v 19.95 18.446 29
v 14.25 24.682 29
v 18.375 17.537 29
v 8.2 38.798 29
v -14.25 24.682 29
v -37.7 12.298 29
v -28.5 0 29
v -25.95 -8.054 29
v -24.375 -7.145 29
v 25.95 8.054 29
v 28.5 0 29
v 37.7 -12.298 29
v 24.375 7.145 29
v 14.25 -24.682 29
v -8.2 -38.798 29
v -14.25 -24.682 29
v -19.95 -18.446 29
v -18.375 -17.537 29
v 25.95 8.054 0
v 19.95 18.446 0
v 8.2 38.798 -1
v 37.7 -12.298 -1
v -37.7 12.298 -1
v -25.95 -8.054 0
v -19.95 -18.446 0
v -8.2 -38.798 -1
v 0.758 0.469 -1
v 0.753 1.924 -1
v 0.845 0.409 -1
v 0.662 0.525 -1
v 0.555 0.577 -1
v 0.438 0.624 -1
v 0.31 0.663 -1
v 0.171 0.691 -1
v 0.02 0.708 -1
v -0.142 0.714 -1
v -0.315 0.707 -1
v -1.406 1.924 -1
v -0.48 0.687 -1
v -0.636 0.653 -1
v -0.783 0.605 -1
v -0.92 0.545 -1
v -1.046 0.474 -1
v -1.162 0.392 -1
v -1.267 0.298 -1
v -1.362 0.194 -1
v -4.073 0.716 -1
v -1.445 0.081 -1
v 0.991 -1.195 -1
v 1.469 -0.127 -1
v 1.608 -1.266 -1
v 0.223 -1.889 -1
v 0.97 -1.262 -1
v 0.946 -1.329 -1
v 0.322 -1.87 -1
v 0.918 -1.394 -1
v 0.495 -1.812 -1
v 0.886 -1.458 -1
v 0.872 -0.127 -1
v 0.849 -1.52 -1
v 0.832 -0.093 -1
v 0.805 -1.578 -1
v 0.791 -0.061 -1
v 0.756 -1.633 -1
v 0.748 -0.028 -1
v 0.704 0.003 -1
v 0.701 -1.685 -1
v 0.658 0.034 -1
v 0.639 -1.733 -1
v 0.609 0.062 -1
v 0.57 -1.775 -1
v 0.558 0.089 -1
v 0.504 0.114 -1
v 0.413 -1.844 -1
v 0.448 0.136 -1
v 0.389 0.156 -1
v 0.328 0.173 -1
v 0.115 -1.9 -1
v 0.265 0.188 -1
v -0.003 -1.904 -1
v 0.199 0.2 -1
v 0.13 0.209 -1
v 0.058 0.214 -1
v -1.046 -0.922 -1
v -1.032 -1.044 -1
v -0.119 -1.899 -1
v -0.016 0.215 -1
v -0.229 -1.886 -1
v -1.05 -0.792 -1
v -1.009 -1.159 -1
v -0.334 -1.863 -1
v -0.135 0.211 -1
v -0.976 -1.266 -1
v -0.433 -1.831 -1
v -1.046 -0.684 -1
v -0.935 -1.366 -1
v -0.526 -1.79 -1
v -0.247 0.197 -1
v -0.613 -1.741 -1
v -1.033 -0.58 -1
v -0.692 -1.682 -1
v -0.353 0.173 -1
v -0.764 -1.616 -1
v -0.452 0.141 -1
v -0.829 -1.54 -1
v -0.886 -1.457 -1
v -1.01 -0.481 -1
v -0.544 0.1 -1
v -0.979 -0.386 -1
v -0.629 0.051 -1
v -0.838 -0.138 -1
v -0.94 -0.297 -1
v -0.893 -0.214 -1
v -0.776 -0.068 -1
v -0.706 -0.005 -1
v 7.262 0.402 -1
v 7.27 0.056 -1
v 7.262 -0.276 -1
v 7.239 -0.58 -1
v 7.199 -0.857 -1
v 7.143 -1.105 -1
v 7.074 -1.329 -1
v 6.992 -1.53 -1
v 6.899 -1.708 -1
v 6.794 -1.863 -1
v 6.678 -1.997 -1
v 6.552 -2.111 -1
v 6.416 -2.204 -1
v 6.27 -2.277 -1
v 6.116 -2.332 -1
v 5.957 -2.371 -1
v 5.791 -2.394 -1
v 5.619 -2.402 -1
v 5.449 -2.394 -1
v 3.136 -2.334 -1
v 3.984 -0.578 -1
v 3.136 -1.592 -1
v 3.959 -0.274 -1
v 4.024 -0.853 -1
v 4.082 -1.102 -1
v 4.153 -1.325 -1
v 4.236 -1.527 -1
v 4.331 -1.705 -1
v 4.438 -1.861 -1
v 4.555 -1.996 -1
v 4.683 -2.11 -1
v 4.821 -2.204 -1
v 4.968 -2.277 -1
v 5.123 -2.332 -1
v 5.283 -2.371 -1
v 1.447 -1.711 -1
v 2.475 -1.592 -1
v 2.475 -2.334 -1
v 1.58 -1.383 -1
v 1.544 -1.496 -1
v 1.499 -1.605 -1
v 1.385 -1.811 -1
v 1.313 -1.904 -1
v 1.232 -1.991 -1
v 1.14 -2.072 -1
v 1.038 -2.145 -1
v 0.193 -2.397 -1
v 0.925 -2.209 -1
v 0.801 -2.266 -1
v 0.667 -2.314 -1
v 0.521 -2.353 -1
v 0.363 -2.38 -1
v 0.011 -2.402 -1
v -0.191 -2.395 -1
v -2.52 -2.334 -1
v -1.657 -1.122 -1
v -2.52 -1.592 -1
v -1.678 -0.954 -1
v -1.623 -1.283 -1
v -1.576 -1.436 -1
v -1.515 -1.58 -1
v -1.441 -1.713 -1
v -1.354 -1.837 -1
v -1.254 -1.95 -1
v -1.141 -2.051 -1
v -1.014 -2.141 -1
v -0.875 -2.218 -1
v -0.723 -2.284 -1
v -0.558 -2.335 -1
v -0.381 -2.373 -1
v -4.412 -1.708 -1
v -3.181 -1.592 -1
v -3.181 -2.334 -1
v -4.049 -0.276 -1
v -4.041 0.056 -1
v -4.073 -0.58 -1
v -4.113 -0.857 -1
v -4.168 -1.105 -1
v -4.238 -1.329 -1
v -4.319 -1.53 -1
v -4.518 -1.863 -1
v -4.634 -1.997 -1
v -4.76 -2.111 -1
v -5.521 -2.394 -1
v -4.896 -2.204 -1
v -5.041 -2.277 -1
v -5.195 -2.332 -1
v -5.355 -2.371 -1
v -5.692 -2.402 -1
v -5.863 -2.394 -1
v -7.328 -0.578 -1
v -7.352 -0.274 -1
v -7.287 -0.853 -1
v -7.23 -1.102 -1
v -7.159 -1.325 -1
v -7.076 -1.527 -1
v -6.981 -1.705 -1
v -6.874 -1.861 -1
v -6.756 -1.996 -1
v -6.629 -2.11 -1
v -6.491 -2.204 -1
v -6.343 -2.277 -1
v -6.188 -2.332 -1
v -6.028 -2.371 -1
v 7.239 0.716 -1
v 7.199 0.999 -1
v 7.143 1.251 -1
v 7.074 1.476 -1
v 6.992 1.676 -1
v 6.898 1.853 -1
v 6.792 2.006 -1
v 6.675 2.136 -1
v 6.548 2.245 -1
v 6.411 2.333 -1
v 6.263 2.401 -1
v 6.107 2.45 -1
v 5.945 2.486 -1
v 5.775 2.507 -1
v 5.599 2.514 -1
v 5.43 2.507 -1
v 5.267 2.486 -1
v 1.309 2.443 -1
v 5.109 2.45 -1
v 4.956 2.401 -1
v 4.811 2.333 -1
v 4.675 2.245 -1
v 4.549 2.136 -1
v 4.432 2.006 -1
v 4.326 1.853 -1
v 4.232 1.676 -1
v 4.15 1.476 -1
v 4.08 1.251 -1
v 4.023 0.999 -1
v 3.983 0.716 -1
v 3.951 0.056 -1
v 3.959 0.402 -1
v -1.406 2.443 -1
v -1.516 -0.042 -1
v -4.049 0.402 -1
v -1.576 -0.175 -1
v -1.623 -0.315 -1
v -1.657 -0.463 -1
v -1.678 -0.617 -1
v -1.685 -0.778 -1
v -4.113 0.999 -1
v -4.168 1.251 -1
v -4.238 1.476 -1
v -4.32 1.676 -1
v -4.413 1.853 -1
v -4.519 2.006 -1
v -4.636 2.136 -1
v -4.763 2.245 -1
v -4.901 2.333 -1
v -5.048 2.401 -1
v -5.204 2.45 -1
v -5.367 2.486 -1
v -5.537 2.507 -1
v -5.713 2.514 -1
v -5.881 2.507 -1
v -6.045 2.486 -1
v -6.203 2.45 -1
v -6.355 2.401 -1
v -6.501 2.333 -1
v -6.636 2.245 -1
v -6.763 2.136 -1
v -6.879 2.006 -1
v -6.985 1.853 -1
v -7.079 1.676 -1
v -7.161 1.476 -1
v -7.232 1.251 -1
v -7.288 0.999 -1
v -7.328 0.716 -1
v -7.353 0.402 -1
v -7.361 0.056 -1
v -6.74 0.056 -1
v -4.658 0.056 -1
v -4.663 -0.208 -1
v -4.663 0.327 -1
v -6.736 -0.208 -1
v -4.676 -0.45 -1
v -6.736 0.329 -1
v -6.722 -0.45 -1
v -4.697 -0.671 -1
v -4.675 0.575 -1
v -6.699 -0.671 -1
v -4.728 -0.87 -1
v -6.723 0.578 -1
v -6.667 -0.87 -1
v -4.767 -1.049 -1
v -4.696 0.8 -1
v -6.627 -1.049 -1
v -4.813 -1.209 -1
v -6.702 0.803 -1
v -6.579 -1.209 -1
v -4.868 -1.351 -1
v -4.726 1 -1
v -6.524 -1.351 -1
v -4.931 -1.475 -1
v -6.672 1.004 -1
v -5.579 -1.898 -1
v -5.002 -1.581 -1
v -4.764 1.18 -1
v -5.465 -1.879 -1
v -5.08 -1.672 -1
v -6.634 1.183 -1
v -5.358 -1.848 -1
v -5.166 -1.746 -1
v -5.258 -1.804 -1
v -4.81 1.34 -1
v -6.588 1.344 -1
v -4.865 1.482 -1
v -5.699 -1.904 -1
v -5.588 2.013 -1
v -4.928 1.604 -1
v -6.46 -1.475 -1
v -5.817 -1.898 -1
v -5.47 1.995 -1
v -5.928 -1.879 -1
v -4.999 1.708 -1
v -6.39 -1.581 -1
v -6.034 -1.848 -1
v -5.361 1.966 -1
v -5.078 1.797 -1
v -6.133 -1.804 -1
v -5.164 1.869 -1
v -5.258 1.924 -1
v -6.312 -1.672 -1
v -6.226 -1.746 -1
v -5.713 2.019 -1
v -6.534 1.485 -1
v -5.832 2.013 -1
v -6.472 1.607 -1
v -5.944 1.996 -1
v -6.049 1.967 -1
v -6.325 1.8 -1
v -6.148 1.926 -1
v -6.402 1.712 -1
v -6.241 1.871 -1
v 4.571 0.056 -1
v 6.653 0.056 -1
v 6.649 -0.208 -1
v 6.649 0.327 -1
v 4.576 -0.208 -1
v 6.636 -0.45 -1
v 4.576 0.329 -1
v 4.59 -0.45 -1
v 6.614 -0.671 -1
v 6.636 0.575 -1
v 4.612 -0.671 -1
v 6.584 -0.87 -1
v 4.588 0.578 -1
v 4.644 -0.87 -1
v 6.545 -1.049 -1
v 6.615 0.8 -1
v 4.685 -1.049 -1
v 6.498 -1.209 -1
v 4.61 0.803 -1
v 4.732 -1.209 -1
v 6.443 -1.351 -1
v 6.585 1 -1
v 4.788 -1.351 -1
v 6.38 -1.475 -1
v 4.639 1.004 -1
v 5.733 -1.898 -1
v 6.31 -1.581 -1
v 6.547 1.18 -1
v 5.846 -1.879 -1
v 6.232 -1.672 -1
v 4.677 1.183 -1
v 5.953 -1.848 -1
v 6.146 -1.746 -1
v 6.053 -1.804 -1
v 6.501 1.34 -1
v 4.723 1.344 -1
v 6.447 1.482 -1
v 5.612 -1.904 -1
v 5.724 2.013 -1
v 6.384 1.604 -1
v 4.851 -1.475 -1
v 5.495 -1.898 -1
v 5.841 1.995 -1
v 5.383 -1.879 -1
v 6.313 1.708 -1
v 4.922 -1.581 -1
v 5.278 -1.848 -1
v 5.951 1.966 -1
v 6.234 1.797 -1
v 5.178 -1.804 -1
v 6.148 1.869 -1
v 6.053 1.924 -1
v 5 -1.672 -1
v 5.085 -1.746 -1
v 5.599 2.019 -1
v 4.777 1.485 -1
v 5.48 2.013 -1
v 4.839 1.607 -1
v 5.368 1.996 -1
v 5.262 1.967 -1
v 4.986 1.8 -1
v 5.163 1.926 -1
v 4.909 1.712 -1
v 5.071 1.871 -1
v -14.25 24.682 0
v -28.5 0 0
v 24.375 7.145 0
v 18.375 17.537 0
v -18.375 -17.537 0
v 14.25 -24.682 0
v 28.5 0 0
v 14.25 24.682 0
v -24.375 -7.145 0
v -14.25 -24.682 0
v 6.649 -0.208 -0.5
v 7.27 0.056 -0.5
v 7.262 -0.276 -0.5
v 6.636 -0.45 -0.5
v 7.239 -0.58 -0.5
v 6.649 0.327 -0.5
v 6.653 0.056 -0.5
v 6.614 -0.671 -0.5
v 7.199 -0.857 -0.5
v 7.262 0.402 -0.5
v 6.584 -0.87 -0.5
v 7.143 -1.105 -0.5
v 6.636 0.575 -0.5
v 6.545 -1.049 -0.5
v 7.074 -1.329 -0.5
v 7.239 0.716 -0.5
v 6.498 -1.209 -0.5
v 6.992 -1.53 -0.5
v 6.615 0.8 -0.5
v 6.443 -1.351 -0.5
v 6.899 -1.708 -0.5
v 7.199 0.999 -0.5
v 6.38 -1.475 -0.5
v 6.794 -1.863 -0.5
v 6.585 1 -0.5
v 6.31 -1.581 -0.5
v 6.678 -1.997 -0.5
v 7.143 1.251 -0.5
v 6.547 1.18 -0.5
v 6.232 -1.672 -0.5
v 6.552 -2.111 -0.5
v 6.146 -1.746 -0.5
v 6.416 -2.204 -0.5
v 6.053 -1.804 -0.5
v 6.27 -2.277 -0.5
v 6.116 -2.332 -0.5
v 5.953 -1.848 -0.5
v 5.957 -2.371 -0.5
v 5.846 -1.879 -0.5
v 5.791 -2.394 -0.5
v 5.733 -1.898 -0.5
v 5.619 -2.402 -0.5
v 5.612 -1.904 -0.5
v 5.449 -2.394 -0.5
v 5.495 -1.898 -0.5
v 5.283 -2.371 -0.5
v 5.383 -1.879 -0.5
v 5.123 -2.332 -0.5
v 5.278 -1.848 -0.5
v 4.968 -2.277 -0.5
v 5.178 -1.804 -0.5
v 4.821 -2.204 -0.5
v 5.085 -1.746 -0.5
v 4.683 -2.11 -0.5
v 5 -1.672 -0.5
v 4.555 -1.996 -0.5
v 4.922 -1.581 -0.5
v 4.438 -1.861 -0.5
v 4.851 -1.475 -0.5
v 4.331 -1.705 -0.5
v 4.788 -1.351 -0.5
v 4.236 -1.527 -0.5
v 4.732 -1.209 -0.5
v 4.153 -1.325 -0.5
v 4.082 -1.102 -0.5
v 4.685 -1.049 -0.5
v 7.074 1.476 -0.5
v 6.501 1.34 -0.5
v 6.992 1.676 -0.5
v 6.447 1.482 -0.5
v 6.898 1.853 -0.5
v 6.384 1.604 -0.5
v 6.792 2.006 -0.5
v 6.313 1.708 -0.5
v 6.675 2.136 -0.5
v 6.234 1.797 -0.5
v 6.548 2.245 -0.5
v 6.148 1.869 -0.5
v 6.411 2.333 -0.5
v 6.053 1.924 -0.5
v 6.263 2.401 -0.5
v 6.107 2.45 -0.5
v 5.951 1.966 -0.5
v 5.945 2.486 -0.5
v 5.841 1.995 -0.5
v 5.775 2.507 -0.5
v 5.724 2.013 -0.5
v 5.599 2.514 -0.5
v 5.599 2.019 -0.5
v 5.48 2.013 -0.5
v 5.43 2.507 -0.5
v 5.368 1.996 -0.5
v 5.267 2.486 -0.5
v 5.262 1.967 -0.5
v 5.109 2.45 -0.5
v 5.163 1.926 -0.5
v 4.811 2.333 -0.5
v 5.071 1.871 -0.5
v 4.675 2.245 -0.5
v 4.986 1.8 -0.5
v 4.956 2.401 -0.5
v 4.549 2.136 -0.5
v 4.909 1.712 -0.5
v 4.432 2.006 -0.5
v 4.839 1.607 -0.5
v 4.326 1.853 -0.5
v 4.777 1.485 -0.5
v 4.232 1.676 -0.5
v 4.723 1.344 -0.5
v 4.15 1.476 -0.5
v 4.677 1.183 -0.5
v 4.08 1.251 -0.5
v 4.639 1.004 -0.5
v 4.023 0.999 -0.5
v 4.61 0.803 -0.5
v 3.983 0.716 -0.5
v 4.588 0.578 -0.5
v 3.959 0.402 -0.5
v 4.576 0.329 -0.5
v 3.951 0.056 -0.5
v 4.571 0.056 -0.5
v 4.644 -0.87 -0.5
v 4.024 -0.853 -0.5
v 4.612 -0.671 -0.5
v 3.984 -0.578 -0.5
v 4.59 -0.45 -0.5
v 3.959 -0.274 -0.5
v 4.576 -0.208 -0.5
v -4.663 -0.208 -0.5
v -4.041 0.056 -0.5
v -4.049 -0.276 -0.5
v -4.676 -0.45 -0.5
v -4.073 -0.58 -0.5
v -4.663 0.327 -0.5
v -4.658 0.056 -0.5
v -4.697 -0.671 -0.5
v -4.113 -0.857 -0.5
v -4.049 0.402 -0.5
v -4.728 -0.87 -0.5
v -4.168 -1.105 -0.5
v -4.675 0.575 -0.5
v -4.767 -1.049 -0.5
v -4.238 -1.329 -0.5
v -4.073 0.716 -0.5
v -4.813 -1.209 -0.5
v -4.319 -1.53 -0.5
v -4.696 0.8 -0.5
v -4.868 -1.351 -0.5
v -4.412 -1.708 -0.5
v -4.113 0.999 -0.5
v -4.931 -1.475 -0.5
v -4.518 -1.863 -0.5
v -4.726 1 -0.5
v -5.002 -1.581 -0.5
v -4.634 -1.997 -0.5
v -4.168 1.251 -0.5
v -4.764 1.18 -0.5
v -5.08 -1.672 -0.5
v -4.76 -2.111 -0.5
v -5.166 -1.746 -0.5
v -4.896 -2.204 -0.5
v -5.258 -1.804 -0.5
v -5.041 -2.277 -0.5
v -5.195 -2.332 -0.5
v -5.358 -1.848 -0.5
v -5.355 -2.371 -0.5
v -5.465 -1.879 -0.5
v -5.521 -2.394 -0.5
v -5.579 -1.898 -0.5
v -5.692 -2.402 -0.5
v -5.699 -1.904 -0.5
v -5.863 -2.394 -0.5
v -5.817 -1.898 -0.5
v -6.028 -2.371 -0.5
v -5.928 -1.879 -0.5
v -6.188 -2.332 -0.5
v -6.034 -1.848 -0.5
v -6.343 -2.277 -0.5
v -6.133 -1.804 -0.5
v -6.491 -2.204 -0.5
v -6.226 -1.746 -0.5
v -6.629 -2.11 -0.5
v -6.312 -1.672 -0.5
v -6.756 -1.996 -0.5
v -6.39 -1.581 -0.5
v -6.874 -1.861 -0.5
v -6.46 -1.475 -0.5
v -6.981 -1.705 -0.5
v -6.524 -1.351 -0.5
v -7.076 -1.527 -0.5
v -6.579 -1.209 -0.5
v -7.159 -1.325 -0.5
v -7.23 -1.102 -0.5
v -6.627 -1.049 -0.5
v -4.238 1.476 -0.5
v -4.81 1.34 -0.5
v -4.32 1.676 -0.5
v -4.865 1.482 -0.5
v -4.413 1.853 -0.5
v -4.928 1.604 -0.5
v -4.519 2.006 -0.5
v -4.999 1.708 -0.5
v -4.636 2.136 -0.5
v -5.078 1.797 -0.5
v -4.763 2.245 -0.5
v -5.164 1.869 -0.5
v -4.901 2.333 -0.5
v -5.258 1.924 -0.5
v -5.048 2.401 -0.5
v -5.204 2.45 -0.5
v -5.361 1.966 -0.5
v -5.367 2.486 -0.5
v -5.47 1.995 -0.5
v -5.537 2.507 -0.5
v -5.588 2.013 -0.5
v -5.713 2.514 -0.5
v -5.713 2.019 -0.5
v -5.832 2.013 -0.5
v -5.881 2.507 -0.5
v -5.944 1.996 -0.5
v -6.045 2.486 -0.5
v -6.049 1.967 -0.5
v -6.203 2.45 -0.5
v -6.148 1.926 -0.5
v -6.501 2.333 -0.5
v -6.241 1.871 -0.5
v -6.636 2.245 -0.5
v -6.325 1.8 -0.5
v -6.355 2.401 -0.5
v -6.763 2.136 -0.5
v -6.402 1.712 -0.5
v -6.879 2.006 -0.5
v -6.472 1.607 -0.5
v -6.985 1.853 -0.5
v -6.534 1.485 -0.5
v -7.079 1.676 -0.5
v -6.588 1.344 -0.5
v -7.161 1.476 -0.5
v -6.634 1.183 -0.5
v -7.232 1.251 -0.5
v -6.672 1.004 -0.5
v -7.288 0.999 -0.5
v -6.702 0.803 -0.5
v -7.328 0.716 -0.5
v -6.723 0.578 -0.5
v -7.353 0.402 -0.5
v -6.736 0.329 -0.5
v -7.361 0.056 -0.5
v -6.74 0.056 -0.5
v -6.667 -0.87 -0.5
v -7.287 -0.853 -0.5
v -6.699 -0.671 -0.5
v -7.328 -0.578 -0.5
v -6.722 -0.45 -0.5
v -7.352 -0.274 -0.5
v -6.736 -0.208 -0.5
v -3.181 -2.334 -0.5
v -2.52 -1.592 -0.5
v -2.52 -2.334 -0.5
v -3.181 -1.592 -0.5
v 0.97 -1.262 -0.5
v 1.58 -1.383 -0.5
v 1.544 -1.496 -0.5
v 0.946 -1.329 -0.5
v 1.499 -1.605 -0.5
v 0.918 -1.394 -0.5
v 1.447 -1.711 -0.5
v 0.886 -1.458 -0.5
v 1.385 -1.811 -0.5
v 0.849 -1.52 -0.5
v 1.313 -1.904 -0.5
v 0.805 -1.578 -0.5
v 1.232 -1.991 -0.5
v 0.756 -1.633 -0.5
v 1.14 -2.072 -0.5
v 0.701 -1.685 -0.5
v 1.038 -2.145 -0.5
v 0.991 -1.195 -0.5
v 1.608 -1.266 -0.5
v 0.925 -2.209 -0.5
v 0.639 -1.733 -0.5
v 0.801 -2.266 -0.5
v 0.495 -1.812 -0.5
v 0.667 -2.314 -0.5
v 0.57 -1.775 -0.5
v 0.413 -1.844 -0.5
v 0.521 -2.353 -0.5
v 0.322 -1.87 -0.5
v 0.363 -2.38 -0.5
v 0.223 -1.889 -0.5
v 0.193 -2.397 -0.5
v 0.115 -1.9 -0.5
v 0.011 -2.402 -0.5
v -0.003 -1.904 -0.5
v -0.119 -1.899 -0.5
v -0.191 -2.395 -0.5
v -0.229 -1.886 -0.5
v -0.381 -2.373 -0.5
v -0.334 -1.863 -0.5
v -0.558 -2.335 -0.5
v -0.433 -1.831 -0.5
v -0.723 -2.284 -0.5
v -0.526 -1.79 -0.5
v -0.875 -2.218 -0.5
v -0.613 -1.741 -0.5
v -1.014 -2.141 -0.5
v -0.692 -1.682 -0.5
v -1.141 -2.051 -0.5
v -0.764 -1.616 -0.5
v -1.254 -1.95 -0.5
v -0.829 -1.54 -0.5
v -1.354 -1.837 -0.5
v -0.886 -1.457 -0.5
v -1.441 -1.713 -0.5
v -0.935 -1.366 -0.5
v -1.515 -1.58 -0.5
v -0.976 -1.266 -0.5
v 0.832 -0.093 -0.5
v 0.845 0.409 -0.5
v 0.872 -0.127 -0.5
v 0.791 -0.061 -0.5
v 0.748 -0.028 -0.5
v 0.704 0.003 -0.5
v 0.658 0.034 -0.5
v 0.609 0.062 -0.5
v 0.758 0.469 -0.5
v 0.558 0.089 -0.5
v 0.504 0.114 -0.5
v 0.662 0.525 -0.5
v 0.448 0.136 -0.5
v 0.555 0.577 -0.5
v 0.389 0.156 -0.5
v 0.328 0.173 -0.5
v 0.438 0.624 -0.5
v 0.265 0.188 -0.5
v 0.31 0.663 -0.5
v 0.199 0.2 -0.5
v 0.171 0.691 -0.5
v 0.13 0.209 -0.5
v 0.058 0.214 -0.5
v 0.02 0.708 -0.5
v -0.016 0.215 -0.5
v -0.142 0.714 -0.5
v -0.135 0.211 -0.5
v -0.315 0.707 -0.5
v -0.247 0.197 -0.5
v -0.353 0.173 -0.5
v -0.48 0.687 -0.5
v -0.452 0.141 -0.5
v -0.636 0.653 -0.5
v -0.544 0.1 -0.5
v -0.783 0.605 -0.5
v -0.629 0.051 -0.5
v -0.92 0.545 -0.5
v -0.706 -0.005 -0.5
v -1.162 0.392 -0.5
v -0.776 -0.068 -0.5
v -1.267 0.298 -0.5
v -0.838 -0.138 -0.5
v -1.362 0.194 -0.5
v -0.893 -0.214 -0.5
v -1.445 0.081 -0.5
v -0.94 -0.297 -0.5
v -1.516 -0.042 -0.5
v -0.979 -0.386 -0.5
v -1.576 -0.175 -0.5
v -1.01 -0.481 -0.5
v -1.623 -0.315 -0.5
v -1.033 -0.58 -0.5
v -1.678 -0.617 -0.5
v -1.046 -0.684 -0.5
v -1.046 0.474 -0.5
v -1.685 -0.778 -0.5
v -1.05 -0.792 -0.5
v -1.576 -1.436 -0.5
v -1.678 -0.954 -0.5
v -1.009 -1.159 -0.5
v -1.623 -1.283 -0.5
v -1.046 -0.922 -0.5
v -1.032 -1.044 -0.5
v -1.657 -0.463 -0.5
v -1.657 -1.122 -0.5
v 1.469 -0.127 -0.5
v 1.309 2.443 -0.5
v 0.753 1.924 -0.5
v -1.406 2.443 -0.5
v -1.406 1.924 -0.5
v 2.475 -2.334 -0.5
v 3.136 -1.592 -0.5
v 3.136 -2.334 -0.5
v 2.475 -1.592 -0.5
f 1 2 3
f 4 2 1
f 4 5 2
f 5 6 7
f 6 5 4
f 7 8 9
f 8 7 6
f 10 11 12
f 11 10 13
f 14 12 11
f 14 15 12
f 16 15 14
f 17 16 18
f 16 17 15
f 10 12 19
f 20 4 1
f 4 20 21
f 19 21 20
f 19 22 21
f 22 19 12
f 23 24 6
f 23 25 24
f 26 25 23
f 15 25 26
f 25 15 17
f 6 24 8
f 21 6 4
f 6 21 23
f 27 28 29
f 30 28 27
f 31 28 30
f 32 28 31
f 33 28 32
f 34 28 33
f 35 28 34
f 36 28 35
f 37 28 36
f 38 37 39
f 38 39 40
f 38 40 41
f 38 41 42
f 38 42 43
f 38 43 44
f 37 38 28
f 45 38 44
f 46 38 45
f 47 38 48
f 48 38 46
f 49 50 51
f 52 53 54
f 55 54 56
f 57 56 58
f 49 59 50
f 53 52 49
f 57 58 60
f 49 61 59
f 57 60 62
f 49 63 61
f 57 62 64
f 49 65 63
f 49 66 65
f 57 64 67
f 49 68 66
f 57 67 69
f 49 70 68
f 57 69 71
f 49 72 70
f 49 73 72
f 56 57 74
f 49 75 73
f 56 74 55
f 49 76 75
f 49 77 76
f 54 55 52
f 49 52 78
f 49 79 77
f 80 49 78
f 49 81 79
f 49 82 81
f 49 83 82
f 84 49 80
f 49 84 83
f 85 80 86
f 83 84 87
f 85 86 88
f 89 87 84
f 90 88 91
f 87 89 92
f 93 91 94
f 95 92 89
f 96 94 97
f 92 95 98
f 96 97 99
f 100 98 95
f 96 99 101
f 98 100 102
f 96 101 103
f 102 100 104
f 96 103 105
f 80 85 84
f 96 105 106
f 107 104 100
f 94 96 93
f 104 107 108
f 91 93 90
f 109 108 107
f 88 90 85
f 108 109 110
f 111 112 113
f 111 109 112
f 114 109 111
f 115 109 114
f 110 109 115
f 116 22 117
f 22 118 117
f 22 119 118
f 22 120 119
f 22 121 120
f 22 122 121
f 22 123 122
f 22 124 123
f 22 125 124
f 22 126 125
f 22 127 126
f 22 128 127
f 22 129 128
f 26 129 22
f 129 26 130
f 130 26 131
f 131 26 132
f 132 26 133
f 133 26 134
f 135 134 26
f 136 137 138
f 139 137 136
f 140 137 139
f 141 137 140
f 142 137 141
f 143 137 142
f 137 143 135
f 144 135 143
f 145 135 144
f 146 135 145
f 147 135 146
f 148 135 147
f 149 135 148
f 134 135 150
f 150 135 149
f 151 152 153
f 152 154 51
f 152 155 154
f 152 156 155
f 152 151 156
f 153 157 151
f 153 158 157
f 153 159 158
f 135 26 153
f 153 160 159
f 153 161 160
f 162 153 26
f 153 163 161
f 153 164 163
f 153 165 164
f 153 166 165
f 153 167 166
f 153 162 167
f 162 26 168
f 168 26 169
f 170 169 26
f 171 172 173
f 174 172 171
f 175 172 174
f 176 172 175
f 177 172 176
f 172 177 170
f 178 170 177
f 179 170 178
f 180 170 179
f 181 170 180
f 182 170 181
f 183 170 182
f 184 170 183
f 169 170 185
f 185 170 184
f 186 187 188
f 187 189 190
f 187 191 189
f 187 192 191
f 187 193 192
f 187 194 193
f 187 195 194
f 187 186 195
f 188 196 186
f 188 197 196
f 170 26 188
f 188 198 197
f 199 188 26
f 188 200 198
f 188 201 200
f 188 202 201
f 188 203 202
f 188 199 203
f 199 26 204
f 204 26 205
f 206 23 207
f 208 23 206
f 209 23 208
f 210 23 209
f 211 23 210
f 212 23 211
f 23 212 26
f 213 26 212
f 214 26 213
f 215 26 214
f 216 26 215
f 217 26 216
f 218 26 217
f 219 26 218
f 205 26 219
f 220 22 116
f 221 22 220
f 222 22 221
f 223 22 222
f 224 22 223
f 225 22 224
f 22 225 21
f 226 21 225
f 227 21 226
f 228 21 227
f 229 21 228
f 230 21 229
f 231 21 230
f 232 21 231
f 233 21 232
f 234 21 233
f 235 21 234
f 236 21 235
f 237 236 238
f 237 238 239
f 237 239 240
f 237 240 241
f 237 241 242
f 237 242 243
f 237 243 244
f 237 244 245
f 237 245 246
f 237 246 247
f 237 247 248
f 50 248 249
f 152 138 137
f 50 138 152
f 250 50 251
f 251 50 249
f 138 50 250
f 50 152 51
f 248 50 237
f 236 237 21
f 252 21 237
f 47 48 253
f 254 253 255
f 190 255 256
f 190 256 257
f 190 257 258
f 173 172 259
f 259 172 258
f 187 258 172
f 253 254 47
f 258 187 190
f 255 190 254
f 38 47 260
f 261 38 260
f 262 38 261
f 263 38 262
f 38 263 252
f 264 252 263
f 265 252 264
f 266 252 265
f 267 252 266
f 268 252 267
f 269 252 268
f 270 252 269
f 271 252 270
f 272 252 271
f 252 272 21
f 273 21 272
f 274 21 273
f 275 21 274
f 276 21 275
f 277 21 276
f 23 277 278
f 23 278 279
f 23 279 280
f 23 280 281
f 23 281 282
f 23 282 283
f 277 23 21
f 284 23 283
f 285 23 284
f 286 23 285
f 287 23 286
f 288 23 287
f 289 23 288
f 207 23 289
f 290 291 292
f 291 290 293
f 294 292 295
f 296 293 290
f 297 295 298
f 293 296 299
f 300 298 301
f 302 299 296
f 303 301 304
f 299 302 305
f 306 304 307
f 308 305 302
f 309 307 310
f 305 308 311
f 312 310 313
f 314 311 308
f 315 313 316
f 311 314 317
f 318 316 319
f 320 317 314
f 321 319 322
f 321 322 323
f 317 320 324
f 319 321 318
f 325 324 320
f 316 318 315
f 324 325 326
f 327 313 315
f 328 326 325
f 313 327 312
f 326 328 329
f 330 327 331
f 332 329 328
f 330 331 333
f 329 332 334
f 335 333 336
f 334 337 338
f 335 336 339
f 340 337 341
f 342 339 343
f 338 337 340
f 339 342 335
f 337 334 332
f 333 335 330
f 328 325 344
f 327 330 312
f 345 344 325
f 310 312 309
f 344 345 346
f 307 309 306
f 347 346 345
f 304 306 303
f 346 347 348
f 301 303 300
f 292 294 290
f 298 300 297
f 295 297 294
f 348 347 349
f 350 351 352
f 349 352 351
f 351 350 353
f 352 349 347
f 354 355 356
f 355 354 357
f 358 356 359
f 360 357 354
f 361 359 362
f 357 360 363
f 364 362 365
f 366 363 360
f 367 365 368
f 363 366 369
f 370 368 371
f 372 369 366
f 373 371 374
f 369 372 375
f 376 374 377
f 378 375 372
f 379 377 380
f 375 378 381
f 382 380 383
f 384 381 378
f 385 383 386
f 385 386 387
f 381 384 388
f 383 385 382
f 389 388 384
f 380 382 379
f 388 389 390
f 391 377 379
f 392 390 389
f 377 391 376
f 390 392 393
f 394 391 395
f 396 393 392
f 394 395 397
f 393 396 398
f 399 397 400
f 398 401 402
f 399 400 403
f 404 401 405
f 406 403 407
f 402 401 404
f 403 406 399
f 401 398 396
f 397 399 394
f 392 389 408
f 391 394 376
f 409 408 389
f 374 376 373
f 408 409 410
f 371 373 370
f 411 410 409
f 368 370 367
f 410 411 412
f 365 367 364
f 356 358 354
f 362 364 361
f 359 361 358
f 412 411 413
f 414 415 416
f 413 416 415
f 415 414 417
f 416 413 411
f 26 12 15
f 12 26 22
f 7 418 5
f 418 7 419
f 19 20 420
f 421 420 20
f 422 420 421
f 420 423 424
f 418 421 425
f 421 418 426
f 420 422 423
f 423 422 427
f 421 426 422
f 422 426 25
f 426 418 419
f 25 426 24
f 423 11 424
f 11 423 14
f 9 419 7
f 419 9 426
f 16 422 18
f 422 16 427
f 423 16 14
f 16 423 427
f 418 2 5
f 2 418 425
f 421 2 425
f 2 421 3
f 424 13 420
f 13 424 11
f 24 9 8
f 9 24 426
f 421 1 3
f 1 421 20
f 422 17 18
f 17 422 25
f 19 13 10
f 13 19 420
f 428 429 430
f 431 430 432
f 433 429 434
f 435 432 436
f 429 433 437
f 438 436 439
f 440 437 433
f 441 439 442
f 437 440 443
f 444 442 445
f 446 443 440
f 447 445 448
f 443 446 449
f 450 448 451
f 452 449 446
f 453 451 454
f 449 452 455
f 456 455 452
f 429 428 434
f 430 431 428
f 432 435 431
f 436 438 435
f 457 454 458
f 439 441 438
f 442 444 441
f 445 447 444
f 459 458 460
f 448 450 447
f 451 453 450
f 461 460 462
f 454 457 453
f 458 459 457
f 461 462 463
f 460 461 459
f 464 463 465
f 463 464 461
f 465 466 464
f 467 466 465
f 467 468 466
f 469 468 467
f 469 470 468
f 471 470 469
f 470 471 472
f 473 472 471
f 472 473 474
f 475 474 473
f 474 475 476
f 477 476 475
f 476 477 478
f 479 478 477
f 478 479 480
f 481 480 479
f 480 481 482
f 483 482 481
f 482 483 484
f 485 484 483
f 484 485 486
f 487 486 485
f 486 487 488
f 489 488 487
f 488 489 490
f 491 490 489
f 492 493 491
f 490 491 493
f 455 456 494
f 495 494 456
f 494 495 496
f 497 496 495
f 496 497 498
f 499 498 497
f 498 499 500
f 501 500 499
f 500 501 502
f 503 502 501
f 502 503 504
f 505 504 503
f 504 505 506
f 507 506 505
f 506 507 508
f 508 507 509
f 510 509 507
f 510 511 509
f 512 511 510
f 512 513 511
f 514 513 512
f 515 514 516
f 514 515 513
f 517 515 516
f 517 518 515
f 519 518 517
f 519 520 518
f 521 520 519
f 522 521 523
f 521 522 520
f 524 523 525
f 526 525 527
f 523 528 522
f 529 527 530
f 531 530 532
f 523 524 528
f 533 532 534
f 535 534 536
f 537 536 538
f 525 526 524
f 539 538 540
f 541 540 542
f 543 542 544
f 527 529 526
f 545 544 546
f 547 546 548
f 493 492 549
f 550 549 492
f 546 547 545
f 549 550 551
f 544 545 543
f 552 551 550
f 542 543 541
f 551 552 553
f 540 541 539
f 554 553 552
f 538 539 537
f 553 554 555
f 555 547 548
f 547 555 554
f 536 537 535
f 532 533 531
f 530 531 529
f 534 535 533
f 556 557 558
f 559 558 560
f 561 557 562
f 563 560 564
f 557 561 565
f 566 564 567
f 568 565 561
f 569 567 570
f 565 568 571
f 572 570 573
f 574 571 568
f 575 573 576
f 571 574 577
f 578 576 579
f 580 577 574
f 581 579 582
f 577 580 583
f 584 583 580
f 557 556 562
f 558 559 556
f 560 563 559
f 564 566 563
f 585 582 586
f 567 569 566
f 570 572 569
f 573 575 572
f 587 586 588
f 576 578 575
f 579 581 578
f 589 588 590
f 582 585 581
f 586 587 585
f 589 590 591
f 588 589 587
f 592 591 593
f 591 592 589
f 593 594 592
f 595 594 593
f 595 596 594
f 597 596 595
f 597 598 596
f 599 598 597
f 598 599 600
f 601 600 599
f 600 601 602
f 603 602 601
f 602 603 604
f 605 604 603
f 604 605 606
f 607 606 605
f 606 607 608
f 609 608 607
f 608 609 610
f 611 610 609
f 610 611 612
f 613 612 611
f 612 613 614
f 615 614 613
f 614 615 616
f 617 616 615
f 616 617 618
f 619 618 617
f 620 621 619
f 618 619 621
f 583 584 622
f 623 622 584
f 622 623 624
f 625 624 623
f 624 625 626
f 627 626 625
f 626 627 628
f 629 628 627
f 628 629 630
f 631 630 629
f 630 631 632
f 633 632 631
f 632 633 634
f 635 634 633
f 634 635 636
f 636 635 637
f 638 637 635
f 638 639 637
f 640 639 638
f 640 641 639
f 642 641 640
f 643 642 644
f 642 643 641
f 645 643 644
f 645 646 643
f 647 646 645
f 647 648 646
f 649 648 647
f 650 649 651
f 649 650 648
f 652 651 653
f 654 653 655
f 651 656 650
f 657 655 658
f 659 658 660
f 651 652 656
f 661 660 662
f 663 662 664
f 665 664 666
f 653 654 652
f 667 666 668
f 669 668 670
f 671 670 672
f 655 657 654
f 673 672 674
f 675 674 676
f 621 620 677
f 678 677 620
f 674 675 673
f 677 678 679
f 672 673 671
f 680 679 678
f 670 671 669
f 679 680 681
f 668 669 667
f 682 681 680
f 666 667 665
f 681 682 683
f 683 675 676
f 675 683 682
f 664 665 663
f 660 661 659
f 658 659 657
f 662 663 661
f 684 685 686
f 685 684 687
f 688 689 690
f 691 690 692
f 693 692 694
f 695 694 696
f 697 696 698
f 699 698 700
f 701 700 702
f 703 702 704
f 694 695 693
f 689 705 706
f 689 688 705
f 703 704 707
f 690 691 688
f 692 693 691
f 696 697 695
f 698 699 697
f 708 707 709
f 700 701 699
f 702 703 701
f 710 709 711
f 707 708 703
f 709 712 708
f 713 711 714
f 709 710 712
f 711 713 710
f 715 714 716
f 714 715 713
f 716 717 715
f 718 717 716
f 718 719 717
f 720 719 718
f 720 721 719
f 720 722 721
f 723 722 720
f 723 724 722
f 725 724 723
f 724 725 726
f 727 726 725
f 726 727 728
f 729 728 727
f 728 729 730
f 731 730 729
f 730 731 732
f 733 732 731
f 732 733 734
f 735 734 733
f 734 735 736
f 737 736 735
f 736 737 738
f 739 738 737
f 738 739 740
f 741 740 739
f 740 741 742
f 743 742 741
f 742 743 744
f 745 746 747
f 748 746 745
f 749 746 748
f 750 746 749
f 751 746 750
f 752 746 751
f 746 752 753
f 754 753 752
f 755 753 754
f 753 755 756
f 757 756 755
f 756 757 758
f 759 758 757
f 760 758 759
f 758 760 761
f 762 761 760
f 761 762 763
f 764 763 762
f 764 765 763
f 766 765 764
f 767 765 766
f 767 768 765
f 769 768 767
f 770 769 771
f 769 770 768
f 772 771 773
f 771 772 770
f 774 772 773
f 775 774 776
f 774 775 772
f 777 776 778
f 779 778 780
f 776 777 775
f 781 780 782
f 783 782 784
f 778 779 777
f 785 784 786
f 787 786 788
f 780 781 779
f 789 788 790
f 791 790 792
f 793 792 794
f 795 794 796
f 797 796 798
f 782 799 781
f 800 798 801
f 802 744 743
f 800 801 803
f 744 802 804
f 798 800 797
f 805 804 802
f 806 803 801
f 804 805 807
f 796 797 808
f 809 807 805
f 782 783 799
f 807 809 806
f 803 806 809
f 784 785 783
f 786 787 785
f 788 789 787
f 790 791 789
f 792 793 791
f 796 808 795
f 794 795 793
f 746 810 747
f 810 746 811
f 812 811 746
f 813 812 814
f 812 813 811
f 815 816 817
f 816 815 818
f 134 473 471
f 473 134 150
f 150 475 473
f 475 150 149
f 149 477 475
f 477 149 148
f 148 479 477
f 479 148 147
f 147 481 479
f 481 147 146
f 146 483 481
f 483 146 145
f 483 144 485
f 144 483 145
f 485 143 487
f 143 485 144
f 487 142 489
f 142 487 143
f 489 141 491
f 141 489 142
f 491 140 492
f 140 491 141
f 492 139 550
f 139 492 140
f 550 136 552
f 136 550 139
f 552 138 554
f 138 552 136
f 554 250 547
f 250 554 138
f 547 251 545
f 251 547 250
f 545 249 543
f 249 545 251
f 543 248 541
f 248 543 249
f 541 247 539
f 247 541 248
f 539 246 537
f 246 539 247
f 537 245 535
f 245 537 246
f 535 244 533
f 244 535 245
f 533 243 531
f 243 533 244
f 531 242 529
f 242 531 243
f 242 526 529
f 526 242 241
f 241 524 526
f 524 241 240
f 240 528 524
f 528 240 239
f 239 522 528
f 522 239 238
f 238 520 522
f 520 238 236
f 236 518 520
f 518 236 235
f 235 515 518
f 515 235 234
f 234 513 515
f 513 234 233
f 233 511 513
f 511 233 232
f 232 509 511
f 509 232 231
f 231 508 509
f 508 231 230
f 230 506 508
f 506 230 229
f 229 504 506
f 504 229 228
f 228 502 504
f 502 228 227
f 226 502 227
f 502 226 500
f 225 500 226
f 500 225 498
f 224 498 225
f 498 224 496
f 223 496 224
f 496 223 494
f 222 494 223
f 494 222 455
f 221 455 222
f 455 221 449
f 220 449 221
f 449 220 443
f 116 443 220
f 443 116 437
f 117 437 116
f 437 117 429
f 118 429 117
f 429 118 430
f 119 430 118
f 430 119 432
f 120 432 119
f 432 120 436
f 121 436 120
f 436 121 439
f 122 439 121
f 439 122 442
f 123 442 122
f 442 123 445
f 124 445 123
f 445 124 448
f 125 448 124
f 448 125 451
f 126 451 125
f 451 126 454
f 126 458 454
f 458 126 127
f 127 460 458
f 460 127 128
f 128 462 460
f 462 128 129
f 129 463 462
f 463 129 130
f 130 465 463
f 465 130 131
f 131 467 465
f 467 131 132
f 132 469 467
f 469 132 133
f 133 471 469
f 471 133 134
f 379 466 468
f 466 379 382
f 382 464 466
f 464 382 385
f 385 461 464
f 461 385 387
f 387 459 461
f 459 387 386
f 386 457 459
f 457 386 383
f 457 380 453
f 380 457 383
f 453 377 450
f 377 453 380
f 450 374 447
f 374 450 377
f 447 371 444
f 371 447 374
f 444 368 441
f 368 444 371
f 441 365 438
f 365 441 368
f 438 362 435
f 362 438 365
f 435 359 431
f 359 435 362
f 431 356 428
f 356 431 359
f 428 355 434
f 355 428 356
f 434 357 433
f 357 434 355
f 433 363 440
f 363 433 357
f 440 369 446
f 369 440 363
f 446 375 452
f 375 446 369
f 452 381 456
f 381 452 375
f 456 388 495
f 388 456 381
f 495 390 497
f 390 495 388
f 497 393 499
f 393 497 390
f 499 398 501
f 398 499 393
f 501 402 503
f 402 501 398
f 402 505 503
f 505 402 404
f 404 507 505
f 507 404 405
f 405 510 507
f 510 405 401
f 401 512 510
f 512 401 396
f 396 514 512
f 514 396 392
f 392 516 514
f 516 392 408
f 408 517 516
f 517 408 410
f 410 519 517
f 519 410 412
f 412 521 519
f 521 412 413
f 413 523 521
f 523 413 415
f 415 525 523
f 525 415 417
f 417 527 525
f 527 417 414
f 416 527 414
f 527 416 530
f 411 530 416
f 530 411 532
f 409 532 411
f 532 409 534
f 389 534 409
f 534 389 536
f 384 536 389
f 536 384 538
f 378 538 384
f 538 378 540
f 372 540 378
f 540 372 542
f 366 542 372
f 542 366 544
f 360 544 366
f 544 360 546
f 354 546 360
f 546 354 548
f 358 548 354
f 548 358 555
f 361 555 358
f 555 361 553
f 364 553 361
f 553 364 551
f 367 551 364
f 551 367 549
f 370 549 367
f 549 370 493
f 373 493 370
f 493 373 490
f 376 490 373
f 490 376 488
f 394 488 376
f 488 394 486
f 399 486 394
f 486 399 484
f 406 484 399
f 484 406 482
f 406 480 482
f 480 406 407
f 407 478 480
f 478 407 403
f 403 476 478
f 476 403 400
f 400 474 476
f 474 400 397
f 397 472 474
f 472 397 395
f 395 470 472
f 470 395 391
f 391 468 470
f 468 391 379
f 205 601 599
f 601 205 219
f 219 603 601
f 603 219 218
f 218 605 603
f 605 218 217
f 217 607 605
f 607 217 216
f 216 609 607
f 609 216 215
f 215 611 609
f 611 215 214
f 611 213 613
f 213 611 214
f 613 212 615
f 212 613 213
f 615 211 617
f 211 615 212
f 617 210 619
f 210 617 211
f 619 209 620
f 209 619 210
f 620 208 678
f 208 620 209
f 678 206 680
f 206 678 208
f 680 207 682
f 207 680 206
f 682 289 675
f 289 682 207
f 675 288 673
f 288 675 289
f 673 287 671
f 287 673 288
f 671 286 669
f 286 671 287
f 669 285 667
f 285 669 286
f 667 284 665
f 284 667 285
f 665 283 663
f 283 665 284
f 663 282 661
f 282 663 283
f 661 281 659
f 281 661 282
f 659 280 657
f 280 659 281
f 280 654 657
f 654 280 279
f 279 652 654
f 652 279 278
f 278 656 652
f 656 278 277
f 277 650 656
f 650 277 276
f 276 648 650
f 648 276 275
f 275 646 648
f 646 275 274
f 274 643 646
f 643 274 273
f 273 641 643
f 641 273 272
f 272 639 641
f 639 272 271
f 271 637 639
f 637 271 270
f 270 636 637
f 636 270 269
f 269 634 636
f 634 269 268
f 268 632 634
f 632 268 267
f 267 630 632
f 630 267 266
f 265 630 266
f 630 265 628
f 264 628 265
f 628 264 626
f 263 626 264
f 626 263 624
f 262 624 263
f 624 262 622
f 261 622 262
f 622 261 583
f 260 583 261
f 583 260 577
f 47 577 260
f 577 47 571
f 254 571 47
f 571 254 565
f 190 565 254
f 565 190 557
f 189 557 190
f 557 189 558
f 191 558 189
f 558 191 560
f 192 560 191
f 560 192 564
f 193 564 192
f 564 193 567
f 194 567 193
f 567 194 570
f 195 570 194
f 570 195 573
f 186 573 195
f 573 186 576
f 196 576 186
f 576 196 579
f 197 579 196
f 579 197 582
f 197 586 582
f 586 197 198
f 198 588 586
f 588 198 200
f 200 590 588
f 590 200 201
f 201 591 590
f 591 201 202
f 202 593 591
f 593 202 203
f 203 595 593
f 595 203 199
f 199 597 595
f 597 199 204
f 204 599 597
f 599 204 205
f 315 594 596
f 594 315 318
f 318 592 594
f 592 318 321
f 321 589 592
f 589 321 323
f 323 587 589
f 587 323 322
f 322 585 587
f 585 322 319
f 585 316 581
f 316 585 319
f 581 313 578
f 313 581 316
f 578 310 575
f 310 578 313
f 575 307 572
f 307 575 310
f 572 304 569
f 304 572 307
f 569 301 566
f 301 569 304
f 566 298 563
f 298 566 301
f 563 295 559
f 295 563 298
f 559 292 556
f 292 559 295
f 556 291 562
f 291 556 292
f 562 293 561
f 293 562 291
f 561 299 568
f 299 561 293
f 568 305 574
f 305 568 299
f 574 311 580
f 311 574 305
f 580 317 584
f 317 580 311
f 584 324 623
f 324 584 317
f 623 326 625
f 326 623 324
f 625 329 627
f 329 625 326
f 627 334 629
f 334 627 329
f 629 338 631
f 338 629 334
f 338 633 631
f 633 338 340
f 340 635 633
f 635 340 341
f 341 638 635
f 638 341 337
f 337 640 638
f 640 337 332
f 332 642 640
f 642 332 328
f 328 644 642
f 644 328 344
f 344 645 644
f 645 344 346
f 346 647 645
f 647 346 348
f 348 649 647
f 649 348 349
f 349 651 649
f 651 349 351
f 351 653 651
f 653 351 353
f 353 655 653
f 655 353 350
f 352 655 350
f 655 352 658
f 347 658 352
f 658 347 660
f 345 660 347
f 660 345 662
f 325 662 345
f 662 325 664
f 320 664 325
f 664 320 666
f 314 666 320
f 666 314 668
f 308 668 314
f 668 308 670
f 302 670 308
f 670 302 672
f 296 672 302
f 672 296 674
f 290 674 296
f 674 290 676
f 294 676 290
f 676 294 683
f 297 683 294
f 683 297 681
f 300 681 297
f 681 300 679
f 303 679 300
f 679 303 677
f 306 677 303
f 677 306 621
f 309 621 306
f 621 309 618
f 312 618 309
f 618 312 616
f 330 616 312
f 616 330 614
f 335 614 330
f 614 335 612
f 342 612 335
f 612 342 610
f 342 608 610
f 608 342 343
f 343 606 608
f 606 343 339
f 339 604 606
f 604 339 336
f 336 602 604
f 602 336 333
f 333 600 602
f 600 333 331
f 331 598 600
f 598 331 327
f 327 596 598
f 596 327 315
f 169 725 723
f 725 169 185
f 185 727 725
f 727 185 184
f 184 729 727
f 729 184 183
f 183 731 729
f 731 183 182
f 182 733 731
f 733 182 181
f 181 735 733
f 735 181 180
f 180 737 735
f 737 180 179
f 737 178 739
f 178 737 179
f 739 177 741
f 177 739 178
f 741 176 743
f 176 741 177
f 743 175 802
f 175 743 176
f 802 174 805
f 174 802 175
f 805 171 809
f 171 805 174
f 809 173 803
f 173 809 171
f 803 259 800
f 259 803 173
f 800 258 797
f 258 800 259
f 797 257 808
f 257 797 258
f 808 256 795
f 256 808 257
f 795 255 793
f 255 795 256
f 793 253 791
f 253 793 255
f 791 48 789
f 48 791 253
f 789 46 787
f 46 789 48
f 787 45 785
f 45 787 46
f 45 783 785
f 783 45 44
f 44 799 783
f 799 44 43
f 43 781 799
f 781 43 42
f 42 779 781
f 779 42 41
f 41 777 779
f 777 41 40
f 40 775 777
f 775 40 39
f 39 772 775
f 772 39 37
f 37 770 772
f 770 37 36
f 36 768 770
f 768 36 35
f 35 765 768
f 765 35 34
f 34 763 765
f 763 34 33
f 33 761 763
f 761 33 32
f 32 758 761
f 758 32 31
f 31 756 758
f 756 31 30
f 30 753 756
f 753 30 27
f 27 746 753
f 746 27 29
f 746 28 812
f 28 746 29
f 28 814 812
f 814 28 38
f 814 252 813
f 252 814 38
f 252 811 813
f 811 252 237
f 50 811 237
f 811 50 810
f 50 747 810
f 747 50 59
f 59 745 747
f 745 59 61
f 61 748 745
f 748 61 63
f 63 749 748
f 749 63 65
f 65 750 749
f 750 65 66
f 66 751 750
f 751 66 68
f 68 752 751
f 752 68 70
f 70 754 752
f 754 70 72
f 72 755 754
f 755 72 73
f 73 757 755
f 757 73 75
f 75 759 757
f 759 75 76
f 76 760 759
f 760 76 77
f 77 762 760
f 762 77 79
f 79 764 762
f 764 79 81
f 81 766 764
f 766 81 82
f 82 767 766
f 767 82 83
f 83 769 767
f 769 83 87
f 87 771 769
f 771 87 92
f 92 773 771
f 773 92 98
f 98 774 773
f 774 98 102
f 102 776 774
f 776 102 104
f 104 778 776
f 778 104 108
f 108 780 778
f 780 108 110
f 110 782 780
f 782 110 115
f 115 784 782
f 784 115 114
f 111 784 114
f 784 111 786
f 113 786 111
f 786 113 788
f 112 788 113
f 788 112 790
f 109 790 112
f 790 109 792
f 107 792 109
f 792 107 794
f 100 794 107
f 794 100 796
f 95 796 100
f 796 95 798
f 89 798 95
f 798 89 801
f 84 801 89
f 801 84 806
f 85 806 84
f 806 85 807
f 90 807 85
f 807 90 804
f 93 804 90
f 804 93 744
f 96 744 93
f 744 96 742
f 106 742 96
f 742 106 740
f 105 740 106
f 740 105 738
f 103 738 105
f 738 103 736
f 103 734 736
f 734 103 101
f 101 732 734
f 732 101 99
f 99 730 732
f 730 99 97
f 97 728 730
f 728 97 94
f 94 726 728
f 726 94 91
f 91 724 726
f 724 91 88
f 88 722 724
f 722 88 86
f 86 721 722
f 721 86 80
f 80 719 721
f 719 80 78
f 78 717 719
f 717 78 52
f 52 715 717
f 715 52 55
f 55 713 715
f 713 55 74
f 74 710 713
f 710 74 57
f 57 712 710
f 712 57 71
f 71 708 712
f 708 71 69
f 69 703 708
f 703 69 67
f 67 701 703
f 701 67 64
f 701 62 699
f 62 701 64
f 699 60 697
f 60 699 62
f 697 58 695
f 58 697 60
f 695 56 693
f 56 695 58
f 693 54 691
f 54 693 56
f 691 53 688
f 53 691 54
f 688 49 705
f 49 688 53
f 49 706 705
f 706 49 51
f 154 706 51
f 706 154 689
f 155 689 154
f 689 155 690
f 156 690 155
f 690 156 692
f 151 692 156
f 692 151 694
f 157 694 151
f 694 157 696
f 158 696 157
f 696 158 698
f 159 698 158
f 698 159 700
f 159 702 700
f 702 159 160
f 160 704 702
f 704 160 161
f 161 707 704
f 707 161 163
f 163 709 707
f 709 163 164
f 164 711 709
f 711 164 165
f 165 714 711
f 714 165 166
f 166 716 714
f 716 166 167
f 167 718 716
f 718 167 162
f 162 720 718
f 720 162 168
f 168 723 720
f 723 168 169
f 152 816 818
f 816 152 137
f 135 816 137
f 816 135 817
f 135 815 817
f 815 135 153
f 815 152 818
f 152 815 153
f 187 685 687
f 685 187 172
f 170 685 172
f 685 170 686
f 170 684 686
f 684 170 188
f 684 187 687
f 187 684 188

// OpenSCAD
version = "0.5.0";

function toUnits(inches, sixteenths) = (inches * 16) + sixteenths;

hexCrossVertex = toUnits(3,7);
channelRadius = (hexCrossVertex / 2) + 1;
stackDepth = toUnits(1,12);
shellWidth = (channelRadius * 2) - 4;
shellHeight = (channelRadius * 2) + 2;
shellDepth = stackDepth + 2;

difference() {
    // shell
    translate ([0 ,0, (shellDepth / 2) - 1]) rotate (30) cube ([shellWidth, shellHeight,  shellDepth], true);
    // channel
    linear_extrude(stackDepth + 2) circle(channelRadius, $fn=6);
    // finger slots
    translate ([0 ,0, (shellDepth / 2) ]) rotate (30) cube ([shellWidth + 2, 12, shellDepth], true);
    // version
        translate ([0, 0, - 0.5])
        rotate ([0,180,0])
            linear_extrude (1) {
                scale (.5, .5, .5)
                text(version, halign = "center", valign = "center");
            } ;
} 
 
 
